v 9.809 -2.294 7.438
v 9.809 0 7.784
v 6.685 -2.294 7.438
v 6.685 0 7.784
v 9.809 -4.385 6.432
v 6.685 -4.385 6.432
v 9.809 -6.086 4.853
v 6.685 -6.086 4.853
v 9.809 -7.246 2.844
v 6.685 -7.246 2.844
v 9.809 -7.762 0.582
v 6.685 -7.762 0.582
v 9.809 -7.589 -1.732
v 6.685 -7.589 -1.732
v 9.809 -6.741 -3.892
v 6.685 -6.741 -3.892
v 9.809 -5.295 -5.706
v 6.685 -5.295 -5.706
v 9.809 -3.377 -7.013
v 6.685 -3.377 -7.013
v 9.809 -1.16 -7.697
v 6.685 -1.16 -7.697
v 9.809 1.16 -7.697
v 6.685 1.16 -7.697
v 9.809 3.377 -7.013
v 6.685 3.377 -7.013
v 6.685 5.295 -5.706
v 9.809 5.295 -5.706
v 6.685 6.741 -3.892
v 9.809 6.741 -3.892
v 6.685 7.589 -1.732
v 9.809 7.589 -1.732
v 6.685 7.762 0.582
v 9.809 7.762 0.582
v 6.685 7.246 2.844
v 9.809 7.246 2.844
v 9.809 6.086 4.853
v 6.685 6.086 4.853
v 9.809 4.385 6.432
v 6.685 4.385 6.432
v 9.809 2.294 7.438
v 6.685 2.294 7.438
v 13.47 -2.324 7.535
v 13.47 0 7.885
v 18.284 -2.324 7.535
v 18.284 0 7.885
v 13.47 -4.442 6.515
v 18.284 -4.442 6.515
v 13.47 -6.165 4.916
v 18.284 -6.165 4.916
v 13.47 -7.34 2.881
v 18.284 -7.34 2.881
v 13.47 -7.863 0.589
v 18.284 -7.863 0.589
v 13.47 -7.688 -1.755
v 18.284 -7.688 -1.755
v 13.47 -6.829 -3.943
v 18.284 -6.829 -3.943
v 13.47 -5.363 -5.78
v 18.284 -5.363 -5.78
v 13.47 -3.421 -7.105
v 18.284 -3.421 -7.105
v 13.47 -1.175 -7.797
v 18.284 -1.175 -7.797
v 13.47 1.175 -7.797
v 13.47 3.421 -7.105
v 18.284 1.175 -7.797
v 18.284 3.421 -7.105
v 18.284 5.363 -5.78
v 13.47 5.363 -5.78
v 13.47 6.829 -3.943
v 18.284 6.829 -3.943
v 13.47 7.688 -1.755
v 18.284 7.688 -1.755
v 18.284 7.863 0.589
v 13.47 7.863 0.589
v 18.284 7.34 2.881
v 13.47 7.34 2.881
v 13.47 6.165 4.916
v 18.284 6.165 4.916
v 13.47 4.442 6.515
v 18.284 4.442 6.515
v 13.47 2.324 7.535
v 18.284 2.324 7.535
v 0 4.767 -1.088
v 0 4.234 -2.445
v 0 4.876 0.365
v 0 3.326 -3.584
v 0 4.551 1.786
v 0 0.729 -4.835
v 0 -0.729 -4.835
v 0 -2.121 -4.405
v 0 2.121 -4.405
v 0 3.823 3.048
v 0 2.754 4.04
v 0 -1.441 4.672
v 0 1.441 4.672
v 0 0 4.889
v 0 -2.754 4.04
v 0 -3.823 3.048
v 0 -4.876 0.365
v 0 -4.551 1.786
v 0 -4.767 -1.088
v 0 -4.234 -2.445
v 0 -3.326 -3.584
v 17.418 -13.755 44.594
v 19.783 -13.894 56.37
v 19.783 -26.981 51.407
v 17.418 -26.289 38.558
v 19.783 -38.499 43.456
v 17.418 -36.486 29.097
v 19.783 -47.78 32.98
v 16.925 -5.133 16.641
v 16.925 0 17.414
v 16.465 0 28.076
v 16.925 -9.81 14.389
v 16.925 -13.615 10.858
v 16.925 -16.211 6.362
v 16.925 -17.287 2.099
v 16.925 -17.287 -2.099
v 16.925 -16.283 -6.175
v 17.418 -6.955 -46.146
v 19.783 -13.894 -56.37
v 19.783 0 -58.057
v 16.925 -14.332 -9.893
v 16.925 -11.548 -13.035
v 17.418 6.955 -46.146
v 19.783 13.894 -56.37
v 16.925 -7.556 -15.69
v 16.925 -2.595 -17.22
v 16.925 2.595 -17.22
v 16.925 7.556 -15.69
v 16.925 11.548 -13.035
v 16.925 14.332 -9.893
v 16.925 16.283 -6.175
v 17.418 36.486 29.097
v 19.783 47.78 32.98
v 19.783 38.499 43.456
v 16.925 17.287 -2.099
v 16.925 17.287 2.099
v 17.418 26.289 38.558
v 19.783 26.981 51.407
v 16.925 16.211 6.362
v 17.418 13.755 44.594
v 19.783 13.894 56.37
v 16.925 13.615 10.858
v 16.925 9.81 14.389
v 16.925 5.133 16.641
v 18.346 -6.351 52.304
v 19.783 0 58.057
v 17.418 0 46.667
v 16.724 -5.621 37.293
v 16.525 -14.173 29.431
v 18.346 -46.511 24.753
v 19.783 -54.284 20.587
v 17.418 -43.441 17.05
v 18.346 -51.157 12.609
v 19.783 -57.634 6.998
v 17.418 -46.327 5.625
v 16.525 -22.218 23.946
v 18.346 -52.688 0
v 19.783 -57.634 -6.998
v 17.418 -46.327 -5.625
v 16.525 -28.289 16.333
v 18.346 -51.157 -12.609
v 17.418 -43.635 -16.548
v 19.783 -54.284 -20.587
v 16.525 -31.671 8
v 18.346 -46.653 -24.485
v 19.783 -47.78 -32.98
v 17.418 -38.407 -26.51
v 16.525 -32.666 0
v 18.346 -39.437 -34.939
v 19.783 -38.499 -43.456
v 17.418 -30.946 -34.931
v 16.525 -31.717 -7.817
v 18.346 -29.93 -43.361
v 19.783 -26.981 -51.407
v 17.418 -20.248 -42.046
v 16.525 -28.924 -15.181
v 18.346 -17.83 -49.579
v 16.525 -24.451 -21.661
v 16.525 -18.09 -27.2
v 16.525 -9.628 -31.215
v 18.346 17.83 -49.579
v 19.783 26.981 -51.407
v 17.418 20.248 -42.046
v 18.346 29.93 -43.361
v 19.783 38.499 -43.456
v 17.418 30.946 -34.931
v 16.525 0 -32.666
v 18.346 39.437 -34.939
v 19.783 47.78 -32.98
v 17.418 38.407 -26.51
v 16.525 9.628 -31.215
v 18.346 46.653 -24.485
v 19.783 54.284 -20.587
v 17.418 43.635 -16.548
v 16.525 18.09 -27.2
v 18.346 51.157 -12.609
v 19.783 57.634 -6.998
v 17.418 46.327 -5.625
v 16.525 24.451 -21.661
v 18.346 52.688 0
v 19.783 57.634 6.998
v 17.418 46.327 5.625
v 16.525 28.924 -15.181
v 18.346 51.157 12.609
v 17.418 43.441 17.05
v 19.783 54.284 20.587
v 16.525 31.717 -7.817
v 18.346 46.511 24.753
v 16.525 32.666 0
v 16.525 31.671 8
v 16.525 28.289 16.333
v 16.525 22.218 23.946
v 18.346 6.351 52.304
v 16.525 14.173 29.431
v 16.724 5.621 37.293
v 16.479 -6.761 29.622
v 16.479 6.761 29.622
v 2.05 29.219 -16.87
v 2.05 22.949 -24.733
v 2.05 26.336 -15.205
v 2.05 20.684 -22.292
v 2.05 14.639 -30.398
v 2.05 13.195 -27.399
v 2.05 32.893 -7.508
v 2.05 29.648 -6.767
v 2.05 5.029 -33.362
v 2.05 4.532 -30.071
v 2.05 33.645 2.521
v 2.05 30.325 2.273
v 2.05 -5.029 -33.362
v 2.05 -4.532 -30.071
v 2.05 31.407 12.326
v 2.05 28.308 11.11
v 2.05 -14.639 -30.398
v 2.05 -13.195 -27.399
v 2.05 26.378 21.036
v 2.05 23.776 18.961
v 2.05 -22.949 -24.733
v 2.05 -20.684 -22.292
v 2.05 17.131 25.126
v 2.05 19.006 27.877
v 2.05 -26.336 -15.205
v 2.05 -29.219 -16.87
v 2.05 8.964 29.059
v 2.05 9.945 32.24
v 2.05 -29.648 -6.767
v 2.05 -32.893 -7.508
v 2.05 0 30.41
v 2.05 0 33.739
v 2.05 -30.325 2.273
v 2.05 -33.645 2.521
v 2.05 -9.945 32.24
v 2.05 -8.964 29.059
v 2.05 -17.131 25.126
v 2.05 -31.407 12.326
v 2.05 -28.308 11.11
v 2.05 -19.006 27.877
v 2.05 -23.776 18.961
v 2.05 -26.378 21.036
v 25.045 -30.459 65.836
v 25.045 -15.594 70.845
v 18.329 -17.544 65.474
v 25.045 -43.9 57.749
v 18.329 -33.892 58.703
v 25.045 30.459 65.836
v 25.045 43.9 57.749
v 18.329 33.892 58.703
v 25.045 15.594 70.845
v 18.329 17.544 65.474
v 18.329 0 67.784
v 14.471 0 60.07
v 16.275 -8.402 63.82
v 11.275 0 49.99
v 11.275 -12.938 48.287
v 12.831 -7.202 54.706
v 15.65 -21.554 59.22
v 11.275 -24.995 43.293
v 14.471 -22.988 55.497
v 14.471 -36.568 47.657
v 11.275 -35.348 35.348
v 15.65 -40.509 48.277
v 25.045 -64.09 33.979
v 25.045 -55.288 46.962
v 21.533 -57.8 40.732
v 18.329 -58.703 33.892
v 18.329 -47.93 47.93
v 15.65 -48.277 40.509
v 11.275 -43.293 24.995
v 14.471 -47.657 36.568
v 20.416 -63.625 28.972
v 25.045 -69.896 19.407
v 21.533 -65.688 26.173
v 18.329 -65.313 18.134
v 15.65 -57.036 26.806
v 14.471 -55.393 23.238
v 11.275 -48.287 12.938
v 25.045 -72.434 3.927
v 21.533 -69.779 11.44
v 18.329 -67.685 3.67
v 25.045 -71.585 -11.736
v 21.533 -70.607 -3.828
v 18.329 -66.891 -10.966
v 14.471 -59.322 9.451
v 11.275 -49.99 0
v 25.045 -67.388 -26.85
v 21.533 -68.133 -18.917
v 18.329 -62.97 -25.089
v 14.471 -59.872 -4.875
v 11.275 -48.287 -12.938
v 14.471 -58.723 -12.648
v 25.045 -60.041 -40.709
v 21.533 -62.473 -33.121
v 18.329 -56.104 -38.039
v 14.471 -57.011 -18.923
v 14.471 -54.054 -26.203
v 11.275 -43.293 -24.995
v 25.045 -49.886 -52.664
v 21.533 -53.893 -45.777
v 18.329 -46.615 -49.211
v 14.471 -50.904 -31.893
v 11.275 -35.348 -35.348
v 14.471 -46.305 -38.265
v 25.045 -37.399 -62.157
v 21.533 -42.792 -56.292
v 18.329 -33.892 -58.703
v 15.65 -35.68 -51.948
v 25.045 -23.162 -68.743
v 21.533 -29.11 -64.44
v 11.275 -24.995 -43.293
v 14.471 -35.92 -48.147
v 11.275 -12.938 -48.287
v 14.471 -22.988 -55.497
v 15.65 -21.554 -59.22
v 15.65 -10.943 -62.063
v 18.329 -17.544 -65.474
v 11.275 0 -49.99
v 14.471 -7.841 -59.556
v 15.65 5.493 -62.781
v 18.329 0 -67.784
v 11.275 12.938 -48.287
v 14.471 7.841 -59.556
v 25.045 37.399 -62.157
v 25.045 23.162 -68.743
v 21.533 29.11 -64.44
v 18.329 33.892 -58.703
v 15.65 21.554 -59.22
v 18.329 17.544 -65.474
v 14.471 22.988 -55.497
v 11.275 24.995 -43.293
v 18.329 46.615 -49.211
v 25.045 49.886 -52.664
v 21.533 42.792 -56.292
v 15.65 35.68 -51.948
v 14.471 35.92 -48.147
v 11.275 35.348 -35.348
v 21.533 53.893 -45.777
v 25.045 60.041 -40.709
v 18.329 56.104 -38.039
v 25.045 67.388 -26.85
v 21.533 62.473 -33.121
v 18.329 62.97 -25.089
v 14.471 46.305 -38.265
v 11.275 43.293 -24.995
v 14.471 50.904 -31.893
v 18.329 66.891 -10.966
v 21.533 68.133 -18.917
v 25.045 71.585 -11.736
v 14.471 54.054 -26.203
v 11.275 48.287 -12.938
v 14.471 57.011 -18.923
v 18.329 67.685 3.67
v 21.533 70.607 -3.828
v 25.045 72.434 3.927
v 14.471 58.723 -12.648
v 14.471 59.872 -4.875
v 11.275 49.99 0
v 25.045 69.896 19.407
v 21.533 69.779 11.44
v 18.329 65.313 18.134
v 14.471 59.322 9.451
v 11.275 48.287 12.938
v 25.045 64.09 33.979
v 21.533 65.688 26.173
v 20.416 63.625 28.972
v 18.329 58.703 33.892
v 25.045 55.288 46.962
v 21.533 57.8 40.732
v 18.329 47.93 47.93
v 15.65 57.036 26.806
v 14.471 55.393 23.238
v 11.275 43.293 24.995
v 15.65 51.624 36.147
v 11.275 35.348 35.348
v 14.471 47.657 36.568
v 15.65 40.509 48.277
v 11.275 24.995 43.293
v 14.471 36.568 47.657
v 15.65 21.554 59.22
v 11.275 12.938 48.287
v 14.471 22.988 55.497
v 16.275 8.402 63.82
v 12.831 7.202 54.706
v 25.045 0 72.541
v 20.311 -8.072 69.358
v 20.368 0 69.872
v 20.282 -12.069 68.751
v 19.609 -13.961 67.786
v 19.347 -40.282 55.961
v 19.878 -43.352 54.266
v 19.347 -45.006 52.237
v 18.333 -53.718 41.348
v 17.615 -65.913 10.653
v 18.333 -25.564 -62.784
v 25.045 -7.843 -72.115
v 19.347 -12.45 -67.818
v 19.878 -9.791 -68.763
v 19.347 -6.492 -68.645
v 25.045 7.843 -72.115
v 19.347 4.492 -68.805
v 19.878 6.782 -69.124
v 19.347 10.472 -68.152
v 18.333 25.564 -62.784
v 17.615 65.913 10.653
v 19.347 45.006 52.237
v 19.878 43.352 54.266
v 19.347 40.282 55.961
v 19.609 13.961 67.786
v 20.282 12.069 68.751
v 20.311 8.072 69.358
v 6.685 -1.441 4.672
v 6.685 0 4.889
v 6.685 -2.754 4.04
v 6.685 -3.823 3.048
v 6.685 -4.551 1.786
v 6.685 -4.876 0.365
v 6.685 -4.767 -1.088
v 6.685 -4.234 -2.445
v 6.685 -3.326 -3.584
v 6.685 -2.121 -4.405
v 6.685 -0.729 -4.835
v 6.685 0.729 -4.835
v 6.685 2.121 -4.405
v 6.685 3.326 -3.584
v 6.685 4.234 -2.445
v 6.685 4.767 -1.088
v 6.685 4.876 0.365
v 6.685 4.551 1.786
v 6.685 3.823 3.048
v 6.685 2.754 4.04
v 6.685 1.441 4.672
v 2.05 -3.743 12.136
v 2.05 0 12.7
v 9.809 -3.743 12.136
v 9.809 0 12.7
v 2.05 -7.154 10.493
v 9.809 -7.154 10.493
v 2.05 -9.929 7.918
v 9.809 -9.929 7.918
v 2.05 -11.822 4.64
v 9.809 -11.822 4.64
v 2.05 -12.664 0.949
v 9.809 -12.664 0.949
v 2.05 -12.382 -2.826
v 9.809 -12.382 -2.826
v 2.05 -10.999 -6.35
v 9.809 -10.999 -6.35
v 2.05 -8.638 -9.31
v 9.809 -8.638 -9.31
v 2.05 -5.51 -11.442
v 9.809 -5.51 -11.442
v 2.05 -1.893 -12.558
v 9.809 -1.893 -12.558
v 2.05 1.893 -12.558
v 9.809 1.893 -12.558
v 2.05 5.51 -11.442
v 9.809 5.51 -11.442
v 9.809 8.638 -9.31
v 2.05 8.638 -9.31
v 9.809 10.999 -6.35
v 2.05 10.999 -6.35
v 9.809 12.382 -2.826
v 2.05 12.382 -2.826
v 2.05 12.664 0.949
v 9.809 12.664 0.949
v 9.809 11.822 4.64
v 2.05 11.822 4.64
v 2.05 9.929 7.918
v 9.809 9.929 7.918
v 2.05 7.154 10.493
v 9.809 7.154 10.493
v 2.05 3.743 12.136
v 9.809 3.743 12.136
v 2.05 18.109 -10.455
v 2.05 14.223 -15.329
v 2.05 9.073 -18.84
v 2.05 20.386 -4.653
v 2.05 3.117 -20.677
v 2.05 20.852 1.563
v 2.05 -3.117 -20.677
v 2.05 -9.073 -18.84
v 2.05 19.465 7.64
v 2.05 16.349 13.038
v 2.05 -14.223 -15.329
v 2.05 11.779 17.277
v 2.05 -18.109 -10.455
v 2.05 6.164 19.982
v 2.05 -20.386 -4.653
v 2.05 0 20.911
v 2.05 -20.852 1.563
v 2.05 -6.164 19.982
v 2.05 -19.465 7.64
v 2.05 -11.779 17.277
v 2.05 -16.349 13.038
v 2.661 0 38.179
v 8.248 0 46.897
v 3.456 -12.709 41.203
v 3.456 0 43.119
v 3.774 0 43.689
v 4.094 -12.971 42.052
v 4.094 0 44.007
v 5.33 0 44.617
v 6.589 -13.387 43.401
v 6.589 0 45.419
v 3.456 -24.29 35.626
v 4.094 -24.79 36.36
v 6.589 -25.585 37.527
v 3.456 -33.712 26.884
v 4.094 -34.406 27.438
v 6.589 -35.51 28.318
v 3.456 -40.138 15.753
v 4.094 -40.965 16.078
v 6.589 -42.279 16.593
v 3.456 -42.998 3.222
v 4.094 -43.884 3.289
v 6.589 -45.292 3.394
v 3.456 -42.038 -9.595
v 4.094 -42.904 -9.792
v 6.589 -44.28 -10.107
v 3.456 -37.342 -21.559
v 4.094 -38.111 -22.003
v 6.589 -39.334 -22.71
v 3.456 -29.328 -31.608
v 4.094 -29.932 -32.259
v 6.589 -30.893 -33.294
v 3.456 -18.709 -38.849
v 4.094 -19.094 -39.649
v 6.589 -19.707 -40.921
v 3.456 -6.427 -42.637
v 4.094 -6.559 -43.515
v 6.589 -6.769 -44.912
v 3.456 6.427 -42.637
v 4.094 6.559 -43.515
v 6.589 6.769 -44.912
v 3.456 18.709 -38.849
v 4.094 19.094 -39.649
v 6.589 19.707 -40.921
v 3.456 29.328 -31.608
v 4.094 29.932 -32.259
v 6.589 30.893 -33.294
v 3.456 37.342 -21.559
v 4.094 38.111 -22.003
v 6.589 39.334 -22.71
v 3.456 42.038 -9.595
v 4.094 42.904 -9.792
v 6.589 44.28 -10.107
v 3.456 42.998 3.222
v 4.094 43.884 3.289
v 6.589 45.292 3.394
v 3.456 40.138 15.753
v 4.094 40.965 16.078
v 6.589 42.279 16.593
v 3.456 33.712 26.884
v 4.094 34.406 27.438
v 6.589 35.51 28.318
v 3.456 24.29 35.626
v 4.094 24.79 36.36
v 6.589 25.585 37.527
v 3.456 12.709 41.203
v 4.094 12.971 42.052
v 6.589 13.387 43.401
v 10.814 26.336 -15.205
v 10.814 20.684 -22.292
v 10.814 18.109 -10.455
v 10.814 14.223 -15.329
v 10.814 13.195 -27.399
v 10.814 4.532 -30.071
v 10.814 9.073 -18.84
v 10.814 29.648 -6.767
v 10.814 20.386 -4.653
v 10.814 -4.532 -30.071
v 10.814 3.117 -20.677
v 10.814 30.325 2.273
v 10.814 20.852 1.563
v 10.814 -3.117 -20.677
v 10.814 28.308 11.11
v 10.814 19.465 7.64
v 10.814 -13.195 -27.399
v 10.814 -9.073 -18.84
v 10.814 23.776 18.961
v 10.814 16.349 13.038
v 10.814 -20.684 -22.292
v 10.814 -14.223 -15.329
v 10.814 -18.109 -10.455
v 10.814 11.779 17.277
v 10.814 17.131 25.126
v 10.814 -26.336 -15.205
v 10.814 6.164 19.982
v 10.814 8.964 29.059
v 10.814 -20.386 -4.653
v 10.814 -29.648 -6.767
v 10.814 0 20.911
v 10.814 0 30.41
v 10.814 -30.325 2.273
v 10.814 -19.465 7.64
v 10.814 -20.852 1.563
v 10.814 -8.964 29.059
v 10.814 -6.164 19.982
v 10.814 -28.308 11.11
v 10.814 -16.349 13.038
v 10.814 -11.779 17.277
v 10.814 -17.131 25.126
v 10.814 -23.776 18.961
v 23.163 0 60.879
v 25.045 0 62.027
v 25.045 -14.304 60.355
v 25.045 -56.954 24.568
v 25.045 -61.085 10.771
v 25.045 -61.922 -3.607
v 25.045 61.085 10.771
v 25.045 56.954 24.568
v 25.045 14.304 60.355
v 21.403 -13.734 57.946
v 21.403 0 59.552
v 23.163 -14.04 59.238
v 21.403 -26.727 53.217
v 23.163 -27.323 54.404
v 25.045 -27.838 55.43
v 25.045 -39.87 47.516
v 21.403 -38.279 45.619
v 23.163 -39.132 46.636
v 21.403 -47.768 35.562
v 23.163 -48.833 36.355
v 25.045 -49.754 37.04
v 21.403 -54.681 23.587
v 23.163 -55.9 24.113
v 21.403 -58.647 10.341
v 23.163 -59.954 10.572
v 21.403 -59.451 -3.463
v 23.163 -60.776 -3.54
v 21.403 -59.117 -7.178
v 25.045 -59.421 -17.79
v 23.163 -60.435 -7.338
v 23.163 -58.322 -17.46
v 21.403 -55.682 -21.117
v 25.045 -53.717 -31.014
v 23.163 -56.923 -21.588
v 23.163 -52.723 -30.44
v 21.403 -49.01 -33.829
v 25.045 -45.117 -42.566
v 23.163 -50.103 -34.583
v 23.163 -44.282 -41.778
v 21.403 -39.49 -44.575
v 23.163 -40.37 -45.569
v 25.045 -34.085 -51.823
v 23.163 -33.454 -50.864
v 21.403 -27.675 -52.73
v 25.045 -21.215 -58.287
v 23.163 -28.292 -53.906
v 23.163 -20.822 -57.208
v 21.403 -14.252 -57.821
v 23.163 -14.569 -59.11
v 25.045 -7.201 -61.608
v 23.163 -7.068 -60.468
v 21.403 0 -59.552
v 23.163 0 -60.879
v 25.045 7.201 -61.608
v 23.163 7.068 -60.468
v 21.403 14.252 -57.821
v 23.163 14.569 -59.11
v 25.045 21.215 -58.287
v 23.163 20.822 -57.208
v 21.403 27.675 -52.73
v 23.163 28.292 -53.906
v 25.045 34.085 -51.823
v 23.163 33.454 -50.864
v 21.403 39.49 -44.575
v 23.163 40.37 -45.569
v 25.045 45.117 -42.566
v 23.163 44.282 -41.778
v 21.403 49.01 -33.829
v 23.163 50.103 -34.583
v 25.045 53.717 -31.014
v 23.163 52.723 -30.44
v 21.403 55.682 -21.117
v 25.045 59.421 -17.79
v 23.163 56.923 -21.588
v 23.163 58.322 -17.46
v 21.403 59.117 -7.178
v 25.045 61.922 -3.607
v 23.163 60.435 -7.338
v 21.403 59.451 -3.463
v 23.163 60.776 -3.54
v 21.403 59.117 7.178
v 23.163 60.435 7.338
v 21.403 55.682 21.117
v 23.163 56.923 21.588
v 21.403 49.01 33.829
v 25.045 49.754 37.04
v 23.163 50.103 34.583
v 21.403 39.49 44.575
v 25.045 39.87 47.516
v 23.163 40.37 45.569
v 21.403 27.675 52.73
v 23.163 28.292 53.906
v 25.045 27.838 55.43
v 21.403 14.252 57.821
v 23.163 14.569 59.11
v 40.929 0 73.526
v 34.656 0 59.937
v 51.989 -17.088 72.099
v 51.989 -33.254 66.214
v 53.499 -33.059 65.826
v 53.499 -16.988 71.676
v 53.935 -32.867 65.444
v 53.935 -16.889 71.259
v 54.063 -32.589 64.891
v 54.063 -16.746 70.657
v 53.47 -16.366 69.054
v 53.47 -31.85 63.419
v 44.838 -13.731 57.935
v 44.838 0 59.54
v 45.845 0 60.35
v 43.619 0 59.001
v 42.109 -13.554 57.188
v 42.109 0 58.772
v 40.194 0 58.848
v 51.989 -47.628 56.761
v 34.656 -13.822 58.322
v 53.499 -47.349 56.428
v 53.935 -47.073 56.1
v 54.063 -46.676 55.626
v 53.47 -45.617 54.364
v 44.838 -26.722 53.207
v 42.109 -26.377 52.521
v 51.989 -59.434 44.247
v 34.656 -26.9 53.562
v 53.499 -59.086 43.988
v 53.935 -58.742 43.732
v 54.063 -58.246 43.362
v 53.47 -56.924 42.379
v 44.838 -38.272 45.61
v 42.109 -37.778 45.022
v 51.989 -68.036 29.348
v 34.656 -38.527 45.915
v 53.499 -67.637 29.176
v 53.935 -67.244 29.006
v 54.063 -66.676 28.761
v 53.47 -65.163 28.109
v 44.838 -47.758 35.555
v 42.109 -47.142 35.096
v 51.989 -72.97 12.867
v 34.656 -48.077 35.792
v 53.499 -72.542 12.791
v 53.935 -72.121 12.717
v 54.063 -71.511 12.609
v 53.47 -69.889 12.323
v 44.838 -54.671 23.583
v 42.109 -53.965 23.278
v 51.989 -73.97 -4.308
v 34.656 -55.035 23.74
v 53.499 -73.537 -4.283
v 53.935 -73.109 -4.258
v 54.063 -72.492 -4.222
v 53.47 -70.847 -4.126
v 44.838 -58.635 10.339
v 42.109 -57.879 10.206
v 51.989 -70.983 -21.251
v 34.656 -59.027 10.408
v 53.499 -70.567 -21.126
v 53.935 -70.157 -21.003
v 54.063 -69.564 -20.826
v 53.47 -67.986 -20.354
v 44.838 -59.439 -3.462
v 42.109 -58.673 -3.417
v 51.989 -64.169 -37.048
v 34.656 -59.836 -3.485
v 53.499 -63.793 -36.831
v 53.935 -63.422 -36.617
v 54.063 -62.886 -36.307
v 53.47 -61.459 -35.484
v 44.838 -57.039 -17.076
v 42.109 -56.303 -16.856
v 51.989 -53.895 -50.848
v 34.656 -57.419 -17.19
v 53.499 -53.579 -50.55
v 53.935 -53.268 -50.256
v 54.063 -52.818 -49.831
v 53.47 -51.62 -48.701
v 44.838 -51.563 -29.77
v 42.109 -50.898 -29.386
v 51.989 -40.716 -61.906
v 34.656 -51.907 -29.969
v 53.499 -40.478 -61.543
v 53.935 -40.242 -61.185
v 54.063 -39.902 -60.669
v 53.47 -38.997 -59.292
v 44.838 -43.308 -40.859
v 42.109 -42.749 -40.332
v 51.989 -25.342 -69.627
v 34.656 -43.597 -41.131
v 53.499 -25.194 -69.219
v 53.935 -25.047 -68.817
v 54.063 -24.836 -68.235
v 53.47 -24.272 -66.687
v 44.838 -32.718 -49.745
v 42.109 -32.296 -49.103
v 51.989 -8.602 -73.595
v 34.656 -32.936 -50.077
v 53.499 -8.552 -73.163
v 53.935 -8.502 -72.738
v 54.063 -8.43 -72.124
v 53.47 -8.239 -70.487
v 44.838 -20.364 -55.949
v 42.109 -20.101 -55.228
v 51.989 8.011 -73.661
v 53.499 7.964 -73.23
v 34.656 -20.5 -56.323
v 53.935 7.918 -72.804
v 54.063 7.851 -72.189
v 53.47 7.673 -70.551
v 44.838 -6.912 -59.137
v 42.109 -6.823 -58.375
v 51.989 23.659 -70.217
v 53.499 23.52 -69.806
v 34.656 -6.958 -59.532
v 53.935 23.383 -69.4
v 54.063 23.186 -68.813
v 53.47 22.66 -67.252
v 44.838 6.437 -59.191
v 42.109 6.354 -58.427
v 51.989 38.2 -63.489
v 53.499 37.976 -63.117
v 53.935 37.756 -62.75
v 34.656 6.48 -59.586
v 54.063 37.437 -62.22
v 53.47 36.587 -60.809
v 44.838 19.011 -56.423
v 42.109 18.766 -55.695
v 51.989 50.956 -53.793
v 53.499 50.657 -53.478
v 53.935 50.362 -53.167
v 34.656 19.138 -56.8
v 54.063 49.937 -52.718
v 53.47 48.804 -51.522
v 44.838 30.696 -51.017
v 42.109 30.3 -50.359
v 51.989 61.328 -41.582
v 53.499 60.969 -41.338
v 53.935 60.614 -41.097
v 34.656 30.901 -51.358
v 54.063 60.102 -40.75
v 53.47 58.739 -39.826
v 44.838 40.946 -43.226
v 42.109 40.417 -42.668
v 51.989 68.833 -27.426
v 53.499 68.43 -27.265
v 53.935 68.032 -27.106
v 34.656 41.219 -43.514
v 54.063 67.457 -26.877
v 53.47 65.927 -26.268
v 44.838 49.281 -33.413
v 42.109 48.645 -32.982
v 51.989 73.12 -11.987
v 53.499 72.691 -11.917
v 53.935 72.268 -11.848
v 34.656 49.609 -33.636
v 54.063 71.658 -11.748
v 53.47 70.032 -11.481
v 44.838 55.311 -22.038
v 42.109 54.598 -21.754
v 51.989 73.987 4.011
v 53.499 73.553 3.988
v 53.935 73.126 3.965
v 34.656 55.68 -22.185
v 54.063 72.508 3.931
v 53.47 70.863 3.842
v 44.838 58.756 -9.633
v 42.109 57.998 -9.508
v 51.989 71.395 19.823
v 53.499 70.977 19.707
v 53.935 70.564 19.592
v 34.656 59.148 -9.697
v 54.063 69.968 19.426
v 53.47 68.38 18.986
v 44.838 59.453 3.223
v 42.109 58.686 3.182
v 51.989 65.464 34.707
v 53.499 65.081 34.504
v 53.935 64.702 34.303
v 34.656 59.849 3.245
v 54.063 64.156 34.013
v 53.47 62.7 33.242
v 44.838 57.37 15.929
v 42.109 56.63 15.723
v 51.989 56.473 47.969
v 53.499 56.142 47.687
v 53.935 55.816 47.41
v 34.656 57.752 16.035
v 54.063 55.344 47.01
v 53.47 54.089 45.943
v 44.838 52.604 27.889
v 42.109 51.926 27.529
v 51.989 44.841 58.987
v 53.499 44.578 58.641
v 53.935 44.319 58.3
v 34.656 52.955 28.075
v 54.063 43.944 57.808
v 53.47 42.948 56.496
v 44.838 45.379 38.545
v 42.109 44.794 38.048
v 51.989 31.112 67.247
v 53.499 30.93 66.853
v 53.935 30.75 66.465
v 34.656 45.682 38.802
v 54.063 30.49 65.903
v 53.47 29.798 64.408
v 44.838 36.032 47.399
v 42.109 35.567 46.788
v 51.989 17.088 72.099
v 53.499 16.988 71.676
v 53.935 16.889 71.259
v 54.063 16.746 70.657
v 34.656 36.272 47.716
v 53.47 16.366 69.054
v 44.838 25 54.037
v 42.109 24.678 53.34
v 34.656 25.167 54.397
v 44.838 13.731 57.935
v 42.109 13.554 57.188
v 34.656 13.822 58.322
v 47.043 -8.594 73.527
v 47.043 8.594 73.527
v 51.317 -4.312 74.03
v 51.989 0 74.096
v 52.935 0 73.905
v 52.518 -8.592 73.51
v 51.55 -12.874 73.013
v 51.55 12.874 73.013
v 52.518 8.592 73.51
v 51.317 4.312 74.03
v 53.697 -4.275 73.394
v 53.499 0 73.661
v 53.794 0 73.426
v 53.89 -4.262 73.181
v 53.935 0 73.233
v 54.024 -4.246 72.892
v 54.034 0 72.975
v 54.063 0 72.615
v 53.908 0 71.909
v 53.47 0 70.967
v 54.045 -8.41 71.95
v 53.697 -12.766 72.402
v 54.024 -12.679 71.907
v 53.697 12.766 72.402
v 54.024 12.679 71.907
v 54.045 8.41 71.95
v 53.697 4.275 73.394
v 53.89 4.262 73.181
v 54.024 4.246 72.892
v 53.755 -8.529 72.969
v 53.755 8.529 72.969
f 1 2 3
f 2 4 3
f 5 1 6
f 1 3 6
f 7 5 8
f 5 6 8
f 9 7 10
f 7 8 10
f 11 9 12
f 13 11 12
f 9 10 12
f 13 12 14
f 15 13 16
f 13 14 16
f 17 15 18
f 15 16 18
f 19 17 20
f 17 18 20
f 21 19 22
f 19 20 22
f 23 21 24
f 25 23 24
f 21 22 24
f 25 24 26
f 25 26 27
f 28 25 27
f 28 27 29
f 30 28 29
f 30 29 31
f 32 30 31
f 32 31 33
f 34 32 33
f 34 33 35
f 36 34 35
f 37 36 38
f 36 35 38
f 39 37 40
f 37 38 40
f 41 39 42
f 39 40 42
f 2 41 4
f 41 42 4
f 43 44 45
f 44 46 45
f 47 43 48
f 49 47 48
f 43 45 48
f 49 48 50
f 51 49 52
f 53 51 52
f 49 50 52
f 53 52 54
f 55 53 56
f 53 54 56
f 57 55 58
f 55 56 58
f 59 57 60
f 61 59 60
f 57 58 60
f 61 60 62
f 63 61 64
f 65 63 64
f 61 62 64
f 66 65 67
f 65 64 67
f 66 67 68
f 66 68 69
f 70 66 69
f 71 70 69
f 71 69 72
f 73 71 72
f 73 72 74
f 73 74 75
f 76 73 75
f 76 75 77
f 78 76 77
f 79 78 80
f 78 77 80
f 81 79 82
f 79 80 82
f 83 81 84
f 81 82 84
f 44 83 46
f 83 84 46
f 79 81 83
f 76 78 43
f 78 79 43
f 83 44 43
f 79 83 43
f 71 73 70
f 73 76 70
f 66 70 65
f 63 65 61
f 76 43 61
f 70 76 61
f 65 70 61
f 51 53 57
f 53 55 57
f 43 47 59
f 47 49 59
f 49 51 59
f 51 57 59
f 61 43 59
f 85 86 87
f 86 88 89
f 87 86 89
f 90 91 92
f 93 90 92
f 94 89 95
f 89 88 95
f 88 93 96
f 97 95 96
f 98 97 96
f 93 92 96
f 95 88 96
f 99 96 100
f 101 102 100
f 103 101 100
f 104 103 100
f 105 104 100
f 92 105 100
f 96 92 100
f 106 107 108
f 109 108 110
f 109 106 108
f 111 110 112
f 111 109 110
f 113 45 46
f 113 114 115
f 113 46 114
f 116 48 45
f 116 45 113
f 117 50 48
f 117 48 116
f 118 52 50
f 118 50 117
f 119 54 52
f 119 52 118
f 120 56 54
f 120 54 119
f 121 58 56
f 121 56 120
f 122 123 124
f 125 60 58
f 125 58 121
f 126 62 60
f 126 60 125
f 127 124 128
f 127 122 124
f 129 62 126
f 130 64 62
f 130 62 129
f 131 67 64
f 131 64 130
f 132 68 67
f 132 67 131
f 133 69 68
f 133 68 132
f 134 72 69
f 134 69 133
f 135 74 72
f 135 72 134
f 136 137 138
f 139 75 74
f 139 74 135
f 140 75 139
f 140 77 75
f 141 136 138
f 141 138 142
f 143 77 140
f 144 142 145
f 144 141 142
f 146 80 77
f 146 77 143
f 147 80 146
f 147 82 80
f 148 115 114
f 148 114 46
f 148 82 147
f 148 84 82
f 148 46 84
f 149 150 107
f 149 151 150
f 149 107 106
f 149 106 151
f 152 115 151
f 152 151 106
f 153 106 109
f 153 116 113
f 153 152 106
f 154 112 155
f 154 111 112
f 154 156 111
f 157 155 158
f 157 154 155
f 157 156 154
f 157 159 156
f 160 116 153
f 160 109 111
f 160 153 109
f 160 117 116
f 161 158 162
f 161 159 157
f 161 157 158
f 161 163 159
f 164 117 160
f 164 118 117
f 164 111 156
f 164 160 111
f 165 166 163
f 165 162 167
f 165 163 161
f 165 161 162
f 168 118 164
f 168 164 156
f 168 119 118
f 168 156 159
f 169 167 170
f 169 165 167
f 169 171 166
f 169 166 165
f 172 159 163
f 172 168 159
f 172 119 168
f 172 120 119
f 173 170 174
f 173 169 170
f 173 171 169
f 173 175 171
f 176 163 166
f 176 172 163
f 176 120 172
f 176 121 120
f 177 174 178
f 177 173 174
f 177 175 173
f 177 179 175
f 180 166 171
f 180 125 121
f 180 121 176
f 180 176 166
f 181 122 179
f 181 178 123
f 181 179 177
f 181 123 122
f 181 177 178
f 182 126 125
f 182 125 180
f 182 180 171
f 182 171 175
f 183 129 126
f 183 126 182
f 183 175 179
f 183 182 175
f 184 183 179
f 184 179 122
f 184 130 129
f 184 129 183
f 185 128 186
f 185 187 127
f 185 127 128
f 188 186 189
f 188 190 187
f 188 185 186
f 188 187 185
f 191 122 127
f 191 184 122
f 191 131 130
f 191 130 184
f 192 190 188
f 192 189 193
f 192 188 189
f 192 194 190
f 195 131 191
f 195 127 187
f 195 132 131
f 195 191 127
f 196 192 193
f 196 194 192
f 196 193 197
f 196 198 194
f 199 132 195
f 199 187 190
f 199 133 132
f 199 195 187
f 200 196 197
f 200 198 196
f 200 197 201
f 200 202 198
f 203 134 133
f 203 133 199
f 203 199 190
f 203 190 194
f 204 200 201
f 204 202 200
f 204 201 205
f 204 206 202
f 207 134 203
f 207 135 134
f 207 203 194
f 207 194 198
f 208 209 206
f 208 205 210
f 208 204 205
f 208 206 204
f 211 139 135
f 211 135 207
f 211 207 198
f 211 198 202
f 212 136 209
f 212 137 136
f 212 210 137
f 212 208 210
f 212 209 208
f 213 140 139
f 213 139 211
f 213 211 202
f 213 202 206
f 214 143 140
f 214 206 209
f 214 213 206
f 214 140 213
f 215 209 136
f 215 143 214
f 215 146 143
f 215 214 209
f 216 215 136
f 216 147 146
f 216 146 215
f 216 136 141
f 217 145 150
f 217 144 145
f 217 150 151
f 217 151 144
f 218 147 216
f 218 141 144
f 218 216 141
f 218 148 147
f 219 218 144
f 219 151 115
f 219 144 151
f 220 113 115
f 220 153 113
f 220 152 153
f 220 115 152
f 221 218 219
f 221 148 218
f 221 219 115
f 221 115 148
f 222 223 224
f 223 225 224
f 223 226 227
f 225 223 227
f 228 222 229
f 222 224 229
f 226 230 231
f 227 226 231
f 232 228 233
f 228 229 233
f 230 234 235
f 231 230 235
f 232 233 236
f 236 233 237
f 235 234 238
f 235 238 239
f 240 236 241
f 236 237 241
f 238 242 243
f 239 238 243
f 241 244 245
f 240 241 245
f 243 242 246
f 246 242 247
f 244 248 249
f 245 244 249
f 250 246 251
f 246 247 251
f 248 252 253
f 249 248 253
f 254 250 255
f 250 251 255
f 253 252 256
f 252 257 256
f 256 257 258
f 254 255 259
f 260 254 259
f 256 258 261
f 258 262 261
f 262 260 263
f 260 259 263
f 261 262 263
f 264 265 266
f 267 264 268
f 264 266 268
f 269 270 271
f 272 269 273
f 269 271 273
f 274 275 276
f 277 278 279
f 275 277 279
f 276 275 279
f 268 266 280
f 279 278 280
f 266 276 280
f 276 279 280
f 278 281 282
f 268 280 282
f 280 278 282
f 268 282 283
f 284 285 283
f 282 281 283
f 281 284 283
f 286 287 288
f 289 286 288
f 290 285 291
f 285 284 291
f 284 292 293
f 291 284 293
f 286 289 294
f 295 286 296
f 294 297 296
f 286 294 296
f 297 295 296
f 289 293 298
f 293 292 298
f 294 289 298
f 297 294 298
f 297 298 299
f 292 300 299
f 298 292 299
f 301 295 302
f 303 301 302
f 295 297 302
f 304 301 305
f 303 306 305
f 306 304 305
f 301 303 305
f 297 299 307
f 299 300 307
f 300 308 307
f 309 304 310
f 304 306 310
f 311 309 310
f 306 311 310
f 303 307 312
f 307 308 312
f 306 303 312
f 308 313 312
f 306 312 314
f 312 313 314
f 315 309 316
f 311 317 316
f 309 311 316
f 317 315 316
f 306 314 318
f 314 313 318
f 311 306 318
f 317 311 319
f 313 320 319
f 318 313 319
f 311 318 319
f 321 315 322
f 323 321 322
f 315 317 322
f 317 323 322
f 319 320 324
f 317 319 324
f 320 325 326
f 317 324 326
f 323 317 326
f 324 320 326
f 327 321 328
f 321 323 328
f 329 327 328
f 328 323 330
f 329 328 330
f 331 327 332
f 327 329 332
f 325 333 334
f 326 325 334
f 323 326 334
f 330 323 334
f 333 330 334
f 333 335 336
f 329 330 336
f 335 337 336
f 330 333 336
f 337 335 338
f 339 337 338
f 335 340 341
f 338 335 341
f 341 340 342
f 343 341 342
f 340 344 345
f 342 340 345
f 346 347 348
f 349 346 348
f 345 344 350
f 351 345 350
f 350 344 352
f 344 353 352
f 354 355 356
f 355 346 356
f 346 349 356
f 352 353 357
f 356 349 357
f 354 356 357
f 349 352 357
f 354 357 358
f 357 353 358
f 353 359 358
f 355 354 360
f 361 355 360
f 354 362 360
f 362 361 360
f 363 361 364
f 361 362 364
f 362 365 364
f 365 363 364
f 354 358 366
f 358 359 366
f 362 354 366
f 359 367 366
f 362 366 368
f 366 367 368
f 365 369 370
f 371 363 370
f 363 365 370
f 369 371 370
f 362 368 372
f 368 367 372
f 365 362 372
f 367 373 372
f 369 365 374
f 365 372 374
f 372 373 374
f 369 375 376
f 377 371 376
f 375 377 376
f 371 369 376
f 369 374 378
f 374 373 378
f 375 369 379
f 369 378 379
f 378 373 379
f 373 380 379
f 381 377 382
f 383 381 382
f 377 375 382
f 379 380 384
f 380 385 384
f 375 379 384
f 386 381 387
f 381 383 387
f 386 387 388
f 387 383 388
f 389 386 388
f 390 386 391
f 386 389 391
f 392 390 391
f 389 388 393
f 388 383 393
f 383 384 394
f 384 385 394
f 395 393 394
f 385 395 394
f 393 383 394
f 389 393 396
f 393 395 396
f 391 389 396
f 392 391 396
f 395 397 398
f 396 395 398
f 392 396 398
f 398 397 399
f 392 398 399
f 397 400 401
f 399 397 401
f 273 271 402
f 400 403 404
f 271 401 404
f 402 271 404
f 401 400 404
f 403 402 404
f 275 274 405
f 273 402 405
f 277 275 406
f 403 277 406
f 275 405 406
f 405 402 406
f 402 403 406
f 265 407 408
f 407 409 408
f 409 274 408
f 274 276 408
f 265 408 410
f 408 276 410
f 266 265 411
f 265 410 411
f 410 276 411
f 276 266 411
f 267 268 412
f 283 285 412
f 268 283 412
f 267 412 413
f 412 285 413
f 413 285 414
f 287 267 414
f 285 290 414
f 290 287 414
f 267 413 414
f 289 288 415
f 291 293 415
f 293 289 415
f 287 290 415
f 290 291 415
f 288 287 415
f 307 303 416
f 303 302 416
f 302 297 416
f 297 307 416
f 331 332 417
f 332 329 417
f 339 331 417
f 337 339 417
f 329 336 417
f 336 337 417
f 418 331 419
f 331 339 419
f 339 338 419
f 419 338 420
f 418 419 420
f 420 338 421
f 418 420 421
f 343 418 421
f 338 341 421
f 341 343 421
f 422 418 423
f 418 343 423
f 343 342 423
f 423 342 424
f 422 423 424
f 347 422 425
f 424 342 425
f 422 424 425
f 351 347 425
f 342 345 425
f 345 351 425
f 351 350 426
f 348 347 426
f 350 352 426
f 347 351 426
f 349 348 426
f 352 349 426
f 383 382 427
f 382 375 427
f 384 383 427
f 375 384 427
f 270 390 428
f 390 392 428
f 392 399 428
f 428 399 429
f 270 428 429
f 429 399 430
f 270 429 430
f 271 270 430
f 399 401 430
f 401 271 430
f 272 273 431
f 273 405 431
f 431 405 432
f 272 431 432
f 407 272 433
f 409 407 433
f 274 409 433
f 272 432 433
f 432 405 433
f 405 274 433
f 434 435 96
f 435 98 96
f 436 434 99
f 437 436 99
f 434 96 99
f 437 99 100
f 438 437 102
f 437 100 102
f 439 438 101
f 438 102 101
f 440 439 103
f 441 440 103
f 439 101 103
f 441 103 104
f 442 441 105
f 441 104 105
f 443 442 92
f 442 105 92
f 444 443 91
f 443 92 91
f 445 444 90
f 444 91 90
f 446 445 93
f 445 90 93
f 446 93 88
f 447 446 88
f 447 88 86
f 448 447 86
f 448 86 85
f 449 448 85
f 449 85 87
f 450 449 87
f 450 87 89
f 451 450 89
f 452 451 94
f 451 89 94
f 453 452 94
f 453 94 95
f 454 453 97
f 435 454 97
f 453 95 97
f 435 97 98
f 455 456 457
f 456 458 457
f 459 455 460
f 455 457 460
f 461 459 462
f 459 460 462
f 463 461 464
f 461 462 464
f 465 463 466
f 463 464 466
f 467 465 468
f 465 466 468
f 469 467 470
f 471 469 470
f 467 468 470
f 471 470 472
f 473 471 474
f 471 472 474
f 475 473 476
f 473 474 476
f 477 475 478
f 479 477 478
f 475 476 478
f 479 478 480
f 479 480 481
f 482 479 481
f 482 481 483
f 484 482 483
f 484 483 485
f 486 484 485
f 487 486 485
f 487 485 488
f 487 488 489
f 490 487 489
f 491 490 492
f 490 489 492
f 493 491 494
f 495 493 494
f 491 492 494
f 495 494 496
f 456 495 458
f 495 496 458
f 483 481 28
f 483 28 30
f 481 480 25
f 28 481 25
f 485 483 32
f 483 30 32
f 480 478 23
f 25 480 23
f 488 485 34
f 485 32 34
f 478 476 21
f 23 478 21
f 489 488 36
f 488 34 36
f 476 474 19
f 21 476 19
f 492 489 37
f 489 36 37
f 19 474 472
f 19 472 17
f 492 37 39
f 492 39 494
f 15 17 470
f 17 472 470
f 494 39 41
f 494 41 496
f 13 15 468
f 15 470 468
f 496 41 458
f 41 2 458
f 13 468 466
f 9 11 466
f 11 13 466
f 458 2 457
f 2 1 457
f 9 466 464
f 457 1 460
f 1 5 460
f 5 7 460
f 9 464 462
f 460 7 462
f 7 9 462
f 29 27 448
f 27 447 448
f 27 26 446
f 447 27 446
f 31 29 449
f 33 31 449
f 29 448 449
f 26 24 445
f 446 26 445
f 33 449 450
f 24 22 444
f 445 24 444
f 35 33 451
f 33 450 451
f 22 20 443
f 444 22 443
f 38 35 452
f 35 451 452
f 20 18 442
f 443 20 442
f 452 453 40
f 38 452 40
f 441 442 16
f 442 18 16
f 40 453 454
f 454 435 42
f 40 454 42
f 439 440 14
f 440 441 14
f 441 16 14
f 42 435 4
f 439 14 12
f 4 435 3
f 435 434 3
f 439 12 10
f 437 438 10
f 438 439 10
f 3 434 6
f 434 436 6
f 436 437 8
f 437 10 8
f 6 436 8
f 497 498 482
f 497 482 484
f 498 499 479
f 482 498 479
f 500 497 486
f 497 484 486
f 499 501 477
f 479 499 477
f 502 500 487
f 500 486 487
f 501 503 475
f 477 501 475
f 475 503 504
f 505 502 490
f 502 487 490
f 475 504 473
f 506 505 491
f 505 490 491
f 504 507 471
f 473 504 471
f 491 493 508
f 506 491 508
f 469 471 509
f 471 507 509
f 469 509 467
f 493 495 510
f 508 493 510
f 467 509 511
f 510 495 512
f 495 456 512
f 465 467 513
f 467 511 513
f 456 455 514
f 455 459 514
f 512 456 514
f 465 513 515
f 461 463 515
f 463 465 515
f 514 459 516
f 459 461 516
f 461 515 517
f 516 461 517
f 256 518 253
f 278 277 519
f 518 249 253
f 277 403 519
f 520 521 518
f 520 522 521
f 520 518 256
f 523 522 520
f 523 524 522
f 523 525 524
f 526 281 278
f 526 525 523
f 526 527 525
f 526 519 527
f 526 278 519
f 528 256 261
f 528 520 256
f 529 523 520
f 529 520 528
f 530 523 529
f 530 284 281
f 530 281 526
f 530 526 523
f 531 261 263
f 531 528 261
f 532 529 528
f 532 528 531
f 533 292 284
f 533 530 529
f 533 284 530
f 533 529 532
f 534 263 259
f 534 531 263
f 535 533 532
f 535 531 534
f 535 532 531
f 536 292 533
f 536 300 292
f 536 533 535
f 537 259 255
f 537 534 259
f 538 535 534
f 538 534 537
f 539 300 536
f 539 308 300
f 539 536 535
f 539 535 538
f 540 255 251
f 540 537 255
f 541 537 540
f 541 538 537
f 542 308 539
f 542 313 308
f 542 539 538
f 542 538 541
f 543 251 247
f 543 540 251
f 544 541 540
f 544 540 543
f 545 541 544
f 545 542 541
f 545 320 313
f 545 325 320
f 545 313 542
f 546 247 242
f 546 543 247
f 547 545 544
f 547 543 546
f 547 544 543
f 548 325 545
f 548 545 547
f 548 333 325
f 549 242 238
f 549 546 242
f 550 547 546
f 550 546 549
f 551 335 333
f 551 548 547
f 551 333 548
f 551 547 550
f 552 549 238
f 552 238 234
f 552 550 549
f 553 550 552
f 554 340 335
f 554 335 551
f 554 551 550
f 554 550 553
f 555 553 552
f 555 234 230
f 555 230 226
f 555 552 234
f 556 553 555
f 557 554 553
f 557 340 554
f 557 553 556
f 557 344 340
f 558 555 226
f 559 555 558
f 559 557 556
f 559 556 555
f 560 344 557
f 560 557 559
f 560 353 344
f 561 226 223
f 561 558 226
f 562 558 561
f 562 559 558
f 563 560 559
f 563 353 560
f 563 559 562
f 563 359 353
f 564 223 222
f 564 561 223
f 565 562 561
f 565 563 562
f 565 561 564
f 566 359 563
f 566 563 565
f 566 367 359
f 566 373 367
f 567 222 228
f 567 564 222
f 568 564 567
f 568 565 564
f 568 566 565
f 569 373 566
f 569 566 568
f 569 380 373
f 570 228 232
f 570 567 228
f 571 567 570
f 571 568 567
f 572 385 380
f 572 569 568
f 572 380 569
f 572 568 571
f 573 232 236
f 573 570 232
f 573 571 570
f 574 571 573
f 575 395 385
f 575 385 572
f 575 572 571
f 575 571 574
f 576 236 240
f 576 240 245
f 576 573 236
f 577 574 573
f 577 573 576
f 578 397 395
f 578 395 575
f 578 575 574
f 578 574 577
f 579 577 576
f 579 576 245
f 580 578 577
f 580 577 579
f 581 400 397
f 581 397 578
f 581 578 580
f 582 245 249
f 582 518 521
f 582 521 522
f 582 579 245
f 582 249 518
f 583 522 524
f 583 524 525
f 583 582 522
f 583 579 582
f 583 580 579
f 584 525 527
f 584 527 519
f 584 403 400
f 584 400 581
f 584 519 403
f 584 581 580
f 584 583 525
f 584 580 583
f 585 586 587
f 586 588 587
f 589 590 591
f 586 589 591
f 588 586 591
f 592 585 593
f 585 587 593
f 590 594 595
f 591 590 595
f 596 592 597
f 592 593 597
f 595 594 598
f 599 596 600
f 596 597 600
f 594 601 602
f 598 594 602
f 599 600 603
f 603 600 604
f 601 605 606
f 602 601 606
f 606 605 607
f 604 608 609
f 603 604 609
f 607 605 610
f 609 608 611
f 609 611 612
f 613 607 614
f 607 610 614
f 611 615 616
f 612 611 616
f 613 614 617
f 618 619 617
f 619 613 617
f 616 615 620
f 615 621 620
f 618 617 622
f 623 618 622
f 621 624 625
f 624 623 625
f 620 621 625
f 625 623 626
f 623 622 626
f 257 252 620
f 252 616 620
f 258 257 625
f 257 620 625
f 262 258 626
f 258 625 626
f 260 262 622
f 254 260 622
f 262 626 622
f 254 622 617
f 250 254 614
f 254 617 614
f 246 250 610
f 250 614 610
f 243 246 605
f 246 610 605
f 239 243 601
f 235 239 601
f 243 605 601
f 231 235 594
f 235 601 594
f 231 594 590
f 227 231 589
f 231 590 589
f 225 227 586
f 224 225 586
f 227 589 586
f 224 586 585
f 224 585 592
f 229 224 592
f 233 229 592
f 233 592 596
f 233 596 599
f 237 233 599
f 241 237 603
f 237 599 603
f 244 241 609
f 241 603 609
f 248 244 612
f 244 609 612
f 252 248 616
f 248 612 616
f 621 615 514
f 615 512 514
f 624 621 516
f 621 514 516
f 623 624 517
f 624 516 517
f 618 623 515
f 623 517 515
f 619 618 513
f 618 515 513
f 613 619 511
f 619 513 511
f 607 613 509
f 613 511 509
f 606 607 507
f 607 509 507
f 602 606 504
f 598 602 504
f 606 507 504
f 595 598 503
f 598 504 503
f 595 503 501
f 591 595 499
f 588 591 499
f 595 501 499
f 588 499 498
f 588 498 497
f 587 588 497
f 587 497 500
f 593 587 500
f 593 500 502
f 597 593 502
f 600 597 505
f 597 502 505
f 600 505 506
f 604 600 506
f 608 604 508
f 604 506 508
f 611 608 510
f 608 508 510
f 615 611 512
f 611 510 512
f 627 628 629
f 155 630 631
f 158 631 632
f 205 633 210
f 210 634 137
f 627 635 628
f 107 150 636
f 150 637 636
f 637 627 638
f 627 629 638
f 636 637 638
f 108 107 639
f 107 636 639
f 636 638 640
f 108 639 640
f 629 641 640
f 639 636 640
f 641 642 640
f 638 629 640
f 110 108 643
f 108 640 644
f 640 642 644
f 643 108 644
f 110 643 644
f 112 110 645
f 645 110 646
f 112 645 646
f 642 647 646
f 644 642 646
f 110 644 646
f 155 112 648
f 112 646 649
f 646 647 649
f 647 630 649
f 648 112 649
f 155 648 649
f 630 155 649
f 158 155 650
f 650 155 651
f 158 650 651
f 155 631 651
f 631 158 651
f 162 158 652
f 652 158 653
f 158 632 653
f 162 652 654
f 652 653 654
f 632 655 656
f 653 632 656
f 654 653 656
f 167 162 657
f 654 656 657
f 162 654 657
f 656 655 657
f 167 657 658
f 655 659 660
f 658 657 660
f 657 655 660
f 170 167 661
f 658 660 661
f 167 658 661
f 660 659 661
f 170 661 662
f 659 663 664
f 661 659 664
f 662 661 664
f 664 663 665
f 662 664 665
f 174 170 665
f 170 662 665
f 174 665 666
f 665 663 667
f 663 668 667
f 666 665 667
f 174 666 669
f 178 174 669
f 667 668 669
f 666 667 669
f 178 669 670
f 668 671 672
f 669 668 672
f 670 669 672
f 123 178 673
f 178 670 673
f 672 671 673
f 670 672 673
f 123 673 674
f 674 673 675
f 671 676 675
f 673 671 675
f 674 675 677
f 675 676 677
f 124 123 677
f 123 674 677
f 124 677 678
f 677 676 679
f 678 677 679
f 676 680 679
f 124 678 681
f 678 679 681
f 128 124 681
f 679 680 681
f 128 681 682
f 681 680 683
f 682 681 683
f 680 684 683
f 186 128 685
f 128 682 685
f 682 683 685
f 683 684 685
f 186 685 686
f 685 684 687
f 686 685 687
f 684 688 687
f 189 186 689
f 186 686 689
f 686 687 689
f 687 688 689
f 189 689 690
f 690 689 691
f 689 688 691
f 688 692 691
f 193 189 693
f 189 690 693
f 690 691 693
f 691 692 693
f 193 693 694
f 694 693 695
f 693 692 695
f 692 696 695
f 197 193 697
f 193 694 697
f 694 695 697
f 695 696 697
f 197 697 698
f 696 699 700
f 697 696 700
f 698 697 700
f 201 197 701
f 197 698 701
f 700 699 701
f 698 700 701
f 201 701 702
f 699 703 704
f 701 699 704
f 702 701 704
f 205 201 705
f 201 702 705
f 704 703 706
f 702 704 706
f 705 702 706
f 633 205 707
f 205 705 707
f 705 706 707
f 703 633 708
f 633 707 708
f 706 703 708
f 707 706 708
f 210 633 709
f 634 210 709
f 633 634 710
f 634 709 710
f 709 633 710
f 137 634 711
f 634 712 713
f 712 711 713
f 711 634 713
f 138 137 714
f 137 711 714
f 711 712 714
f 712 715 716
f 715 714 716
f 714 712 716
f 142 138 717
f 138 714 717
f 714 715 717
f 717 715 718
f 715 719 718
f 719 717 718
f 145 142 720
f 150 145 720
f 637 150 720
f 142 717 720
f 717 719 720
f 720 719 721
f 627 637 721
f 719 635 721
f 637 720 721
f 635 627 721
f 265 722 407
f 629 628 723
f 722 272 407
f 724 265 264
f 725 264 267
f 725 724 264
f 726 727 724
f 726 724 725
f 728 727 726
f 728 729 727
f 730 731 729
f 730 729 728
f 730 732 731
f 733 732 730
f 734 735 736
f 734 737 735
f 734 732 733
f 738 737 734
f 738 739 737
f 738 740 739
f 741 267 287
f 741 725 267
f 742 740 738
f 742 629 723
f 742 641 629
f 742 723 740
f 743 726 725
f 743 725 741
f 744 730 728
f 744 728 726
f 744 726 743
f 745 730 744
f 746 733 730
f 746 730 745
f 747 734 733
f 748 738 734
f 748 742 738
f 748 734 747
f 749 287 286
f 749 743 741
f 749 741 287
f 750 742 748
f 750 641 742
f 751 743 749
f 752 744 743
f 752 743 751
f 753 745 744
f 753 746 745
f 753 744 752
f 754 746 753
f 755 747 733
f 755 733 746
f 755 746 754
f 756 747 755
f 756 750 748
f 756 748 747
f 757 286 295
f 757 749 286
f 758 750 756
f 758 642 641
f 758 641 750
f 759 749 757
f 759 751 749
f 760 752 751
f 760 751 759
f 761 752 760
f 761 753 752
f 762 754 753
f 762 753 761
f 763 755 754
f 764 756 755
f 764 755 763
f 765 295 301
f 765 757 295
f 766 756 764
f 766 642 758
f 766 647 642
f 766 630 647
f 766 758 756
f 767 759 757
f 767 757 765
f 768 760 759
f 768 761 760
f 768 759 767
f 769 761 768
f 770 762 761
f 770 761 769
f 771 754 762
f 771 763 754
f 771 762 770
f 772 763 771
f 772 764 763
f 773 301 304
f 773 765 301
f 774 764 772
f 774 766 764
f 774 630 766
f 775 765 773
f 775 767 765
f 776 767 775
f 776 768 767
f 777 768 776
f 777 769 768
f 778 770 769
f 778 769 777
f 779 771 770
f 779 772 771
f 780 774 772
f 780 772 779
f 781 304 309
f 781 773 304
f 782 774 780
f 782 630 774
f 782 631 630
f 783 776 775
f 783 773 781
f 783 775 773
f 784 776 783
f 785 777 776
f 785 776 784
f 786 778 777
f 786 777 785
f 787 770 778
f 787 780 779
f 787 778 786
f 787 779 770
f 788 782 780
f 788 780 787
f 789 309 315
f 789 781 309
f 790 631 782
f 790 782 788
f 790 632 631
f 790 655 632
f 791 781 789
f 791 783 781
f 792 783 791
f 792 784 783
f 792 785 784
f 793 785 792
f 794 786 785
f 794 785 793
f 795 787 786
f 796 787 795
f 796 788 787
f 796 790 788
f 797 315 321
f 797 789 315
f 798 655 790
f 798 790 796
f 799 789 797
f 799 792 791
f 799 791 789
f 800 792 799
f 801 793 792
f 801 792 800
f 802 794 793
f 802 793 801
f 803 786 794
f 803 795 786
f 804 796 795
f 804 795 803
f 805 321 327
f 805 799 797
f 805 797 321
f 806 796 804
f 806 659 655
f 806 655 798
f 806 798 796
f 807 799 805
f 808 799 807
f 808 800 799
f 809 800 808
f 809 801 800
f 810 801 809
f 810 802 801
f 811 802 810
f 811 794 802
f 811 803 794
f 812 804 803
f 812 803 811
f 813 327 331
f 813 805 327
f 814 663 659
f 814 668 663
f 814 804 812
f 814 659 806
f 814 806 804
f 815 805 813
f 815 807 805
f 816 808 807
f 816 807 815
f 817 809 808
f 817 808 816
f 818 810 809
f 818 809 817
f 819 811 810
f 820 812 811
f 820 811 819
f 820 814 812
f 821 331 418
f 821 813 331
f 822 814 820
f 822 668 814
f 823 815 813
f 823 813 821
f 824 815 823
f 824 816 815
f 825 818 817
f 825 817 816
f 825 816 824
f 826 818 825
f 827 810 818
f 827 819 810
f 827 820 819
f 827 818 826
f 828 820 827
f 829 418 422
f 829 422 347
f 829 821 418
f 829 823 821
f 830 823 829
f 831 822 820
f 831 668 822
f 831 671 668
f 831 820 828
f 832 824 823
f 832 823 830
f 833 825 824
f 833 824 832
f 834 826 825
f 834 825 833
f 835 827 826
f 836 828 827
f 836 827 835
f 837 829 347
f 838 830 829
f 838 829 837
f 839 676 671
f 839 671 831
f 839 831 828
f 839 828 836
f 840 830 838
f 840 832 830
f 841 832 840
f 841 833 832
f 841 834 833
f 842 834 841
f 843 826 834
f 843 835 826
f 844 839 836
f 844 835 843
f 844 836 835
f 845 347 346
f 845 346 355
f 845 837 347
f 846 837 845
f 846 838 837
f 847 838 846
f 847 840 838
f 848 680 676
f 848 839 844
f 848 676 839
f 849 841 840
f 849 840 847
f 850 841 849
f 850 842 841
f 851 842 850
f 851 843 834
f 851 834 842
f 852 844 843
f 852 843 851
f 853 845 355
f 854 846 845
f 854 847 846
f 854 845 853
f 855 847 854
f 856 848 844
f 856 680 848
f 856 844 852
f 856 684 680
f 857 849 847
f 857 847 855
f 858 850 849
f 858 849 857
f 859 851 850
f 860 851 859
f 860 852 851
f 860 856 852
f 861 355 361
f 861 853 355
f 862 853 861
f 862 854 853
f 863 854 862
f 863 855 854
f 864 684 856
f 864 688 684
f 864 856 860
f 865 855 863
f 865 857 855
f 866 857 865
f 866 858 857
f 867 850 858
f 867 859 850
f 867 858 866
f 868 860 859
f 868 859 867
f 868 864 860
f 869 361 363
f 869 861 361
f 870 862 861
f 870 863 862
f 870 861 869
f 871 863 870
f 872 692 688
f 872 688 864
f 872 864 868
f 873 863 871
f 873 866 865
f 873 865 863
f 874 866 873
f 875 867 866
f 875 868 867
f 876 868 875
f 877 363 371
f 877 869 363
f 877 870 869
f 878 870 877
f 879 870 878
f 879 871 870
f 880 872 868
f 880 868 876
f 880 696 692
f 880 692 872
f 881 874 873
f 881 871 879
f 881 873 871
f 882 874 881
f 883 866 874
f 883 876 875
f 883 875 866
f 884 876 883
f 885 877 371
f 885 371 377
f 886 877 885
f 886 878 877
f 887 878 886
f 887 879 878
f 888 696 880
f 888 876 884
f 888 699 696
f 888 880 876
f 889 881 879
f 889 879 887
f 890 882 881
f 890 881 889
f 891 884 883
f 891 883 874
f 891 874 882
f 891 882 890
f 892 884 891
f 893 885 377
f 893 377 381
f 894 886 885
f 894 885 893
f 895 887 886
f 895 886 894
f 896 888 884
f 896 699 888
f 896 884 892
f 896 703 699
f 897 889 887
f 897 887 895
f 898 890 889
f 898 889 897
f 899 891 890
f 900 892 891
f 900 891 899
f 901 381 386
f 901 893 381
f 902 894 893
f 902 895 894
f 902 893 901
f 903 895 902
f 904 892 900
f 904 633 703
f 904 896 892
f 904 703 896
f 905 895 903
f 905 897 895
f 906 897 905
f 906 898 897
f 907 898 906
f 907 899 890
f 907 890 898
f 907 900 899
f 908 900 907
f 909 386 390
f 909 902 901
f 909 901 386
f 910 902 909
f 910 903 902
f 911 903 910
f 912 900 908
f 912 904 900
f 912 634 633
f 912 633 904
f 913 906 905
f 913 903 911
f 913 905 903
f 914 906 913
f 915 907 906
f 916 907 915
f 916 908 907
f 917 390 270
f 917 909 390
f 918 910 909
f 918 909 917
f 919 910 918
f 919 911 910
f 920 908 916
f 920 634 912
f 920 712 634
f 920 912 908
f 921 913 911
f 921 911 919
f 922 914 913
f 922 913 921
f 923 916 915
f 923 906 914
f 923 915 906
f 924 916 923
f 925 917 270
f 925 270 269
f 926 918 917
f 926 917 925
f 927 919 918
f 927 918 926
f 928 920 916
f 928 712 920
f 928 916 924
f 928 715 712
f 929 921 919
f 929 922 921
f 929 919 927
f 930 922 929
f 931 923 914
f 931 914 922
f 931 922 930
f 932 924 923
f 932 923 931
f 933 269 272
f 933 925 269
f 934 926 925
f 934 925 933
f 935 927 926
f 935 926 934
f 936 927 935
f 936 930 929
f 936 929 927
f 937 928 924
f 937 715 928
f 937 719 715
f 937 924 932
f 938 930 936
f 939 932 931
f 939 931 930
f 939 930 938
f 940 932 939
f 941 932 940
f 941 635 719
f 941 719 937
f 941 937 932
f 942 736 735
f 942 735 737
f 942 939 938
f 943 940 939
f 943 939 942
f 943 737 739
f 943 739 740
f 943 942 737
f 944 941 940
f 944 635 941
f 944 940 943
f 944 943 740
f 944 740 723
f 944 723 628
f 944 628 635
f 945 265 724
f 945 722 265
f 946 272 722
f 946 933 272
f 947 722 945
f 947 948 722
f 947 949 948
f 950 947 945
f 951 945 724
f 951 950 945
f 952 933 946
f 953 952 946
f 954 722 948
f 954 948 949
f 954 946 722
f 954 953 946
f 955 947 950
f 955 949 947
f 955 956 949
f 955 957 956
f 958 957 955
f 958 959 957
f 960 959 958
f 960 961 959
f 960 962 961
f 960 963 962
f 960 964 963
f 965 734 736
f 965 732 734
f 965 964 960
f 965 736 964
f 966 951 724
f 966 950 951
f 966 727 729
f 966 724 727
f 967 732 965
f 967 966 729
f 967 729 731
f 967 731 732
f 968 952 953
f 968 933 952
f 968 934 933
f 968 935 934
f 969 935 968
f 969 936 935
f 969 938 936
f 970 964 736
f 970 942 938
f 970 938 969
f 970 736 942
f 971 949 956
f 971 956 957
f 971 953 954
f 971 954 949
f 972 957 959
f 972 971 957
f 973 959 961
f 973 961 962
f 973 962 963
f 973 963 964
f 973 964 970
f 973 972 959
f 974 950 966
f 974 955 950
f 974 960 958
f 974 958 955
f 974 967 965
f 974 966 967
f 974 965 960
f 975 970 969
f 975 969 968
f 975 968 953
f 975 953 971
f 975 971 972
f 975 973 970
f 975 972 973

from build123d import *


with BuildPart() as f1:
    # F0 (on Front) → F1 (revolve)
    with BuildSketch(Plane.XZ):
        with BuildLine():
            Line((0, 4.8892499771), (0, 0))
            Line((0, 0), (13.4703844504, 0))
            Line((13.4703844504, 0), (13.4703844504, 7.8854212034))
            Line((13.4703844504, 7.8854212034), (18.2835152883, 7.8854212034))
            add(Edge.make_bspline(
                [(19.7826191295, 58.0572025918), (17.8335590226, 52.4471451864), (16.2426285763, 36.9139396244), (16.2571254085, 17.9699584316), (18.2835152883, 7.8854212034)],
                knots=[0, 0, 0, 0, 0.4544145268, 1, 1, 1, 1], degree=3))
            ThreePointArc((19.7826191295, 58.0572025918), (22.2666852239, 60.2372118596), (25.0449335956, 62.0272846946))
            add(Edge.make_bspline(
                [(25.0449335956, 72.5405053556), (29.3261469951, 73.2513126197), (40.4980322866, 72.9793920522), (58.4873266538, 75.6623446598), (47.9910017048, 64.5001212795), (44.5367963089, 55.692587177), (29.8017418989, 61.7410048111), (25.0449335956, 62.0272846946)],
                knots=[0, 0, 0, 0, 0.229722716, 0.4243182867, 0.5989886066, 0.7613633455, 1, 1, 1, 1], degree=3))
            add(Edge.make_bspline(
                [(25.0449335956, 72.5405053556), (22.7219305608, 71.4663212652), (16.7928015797, 68.7246218674), (13.3619010734, 57.0752780804), (11.2752101996, 49.9900888357)],
                knots=[0, 0, 0, 0, 0.3917949908, 1, 1, 1, 1], degree=3))
            add(Edge.make_bspline(
                [(2.0504690139, 33.7393051757), (2.665329475, 35.2003555209), (2.5675073151, 44.3560169012), (5.9601369277, 44.1859253123), (9.6079048573, 48.3134984791), (11.2752101996, 49.9900888357)],
                knots=[0, 0, 0, 0, 0.4123997011, 0.6319744729, 1, 1, 1, 1], degree=3))
            Line((2.0504690139, 33.7393051757), (2.0504690139, 30.4103687883))
            Line((2.0504690139, 30.4103687883), (10.8138929003, 30.4103687883))
            Line((10.8138929003, 30.4103687883), (10.8138929003, 20.9107687883))
            Line((10.8138929003, 20.9107687883), (2.0504690139, 20.9107687883))
            Line((2.0504690139, 20.9107687883), (2.0504690139, 12.7))
            Line((2.0504690139, 12.7), (9.8092639819, 12.7))
            Line((9.8092639819, 12.7), (9.8092639819, 7.7841216698))
            Line((9.8092639819, 7.7841216698), (6.6853011078, 7.7841216698))
            Line((6.6853011078, 7.7841216698), (6.6853011078, 4.8892499771))
            Line((6.6853011078, 4.8892499771), (0, 4.8892499771))
        make_face()
    revolve(axis=Axis((6.7351922252, 0, 0), (1, 0, 0)))


solid = f1.part
